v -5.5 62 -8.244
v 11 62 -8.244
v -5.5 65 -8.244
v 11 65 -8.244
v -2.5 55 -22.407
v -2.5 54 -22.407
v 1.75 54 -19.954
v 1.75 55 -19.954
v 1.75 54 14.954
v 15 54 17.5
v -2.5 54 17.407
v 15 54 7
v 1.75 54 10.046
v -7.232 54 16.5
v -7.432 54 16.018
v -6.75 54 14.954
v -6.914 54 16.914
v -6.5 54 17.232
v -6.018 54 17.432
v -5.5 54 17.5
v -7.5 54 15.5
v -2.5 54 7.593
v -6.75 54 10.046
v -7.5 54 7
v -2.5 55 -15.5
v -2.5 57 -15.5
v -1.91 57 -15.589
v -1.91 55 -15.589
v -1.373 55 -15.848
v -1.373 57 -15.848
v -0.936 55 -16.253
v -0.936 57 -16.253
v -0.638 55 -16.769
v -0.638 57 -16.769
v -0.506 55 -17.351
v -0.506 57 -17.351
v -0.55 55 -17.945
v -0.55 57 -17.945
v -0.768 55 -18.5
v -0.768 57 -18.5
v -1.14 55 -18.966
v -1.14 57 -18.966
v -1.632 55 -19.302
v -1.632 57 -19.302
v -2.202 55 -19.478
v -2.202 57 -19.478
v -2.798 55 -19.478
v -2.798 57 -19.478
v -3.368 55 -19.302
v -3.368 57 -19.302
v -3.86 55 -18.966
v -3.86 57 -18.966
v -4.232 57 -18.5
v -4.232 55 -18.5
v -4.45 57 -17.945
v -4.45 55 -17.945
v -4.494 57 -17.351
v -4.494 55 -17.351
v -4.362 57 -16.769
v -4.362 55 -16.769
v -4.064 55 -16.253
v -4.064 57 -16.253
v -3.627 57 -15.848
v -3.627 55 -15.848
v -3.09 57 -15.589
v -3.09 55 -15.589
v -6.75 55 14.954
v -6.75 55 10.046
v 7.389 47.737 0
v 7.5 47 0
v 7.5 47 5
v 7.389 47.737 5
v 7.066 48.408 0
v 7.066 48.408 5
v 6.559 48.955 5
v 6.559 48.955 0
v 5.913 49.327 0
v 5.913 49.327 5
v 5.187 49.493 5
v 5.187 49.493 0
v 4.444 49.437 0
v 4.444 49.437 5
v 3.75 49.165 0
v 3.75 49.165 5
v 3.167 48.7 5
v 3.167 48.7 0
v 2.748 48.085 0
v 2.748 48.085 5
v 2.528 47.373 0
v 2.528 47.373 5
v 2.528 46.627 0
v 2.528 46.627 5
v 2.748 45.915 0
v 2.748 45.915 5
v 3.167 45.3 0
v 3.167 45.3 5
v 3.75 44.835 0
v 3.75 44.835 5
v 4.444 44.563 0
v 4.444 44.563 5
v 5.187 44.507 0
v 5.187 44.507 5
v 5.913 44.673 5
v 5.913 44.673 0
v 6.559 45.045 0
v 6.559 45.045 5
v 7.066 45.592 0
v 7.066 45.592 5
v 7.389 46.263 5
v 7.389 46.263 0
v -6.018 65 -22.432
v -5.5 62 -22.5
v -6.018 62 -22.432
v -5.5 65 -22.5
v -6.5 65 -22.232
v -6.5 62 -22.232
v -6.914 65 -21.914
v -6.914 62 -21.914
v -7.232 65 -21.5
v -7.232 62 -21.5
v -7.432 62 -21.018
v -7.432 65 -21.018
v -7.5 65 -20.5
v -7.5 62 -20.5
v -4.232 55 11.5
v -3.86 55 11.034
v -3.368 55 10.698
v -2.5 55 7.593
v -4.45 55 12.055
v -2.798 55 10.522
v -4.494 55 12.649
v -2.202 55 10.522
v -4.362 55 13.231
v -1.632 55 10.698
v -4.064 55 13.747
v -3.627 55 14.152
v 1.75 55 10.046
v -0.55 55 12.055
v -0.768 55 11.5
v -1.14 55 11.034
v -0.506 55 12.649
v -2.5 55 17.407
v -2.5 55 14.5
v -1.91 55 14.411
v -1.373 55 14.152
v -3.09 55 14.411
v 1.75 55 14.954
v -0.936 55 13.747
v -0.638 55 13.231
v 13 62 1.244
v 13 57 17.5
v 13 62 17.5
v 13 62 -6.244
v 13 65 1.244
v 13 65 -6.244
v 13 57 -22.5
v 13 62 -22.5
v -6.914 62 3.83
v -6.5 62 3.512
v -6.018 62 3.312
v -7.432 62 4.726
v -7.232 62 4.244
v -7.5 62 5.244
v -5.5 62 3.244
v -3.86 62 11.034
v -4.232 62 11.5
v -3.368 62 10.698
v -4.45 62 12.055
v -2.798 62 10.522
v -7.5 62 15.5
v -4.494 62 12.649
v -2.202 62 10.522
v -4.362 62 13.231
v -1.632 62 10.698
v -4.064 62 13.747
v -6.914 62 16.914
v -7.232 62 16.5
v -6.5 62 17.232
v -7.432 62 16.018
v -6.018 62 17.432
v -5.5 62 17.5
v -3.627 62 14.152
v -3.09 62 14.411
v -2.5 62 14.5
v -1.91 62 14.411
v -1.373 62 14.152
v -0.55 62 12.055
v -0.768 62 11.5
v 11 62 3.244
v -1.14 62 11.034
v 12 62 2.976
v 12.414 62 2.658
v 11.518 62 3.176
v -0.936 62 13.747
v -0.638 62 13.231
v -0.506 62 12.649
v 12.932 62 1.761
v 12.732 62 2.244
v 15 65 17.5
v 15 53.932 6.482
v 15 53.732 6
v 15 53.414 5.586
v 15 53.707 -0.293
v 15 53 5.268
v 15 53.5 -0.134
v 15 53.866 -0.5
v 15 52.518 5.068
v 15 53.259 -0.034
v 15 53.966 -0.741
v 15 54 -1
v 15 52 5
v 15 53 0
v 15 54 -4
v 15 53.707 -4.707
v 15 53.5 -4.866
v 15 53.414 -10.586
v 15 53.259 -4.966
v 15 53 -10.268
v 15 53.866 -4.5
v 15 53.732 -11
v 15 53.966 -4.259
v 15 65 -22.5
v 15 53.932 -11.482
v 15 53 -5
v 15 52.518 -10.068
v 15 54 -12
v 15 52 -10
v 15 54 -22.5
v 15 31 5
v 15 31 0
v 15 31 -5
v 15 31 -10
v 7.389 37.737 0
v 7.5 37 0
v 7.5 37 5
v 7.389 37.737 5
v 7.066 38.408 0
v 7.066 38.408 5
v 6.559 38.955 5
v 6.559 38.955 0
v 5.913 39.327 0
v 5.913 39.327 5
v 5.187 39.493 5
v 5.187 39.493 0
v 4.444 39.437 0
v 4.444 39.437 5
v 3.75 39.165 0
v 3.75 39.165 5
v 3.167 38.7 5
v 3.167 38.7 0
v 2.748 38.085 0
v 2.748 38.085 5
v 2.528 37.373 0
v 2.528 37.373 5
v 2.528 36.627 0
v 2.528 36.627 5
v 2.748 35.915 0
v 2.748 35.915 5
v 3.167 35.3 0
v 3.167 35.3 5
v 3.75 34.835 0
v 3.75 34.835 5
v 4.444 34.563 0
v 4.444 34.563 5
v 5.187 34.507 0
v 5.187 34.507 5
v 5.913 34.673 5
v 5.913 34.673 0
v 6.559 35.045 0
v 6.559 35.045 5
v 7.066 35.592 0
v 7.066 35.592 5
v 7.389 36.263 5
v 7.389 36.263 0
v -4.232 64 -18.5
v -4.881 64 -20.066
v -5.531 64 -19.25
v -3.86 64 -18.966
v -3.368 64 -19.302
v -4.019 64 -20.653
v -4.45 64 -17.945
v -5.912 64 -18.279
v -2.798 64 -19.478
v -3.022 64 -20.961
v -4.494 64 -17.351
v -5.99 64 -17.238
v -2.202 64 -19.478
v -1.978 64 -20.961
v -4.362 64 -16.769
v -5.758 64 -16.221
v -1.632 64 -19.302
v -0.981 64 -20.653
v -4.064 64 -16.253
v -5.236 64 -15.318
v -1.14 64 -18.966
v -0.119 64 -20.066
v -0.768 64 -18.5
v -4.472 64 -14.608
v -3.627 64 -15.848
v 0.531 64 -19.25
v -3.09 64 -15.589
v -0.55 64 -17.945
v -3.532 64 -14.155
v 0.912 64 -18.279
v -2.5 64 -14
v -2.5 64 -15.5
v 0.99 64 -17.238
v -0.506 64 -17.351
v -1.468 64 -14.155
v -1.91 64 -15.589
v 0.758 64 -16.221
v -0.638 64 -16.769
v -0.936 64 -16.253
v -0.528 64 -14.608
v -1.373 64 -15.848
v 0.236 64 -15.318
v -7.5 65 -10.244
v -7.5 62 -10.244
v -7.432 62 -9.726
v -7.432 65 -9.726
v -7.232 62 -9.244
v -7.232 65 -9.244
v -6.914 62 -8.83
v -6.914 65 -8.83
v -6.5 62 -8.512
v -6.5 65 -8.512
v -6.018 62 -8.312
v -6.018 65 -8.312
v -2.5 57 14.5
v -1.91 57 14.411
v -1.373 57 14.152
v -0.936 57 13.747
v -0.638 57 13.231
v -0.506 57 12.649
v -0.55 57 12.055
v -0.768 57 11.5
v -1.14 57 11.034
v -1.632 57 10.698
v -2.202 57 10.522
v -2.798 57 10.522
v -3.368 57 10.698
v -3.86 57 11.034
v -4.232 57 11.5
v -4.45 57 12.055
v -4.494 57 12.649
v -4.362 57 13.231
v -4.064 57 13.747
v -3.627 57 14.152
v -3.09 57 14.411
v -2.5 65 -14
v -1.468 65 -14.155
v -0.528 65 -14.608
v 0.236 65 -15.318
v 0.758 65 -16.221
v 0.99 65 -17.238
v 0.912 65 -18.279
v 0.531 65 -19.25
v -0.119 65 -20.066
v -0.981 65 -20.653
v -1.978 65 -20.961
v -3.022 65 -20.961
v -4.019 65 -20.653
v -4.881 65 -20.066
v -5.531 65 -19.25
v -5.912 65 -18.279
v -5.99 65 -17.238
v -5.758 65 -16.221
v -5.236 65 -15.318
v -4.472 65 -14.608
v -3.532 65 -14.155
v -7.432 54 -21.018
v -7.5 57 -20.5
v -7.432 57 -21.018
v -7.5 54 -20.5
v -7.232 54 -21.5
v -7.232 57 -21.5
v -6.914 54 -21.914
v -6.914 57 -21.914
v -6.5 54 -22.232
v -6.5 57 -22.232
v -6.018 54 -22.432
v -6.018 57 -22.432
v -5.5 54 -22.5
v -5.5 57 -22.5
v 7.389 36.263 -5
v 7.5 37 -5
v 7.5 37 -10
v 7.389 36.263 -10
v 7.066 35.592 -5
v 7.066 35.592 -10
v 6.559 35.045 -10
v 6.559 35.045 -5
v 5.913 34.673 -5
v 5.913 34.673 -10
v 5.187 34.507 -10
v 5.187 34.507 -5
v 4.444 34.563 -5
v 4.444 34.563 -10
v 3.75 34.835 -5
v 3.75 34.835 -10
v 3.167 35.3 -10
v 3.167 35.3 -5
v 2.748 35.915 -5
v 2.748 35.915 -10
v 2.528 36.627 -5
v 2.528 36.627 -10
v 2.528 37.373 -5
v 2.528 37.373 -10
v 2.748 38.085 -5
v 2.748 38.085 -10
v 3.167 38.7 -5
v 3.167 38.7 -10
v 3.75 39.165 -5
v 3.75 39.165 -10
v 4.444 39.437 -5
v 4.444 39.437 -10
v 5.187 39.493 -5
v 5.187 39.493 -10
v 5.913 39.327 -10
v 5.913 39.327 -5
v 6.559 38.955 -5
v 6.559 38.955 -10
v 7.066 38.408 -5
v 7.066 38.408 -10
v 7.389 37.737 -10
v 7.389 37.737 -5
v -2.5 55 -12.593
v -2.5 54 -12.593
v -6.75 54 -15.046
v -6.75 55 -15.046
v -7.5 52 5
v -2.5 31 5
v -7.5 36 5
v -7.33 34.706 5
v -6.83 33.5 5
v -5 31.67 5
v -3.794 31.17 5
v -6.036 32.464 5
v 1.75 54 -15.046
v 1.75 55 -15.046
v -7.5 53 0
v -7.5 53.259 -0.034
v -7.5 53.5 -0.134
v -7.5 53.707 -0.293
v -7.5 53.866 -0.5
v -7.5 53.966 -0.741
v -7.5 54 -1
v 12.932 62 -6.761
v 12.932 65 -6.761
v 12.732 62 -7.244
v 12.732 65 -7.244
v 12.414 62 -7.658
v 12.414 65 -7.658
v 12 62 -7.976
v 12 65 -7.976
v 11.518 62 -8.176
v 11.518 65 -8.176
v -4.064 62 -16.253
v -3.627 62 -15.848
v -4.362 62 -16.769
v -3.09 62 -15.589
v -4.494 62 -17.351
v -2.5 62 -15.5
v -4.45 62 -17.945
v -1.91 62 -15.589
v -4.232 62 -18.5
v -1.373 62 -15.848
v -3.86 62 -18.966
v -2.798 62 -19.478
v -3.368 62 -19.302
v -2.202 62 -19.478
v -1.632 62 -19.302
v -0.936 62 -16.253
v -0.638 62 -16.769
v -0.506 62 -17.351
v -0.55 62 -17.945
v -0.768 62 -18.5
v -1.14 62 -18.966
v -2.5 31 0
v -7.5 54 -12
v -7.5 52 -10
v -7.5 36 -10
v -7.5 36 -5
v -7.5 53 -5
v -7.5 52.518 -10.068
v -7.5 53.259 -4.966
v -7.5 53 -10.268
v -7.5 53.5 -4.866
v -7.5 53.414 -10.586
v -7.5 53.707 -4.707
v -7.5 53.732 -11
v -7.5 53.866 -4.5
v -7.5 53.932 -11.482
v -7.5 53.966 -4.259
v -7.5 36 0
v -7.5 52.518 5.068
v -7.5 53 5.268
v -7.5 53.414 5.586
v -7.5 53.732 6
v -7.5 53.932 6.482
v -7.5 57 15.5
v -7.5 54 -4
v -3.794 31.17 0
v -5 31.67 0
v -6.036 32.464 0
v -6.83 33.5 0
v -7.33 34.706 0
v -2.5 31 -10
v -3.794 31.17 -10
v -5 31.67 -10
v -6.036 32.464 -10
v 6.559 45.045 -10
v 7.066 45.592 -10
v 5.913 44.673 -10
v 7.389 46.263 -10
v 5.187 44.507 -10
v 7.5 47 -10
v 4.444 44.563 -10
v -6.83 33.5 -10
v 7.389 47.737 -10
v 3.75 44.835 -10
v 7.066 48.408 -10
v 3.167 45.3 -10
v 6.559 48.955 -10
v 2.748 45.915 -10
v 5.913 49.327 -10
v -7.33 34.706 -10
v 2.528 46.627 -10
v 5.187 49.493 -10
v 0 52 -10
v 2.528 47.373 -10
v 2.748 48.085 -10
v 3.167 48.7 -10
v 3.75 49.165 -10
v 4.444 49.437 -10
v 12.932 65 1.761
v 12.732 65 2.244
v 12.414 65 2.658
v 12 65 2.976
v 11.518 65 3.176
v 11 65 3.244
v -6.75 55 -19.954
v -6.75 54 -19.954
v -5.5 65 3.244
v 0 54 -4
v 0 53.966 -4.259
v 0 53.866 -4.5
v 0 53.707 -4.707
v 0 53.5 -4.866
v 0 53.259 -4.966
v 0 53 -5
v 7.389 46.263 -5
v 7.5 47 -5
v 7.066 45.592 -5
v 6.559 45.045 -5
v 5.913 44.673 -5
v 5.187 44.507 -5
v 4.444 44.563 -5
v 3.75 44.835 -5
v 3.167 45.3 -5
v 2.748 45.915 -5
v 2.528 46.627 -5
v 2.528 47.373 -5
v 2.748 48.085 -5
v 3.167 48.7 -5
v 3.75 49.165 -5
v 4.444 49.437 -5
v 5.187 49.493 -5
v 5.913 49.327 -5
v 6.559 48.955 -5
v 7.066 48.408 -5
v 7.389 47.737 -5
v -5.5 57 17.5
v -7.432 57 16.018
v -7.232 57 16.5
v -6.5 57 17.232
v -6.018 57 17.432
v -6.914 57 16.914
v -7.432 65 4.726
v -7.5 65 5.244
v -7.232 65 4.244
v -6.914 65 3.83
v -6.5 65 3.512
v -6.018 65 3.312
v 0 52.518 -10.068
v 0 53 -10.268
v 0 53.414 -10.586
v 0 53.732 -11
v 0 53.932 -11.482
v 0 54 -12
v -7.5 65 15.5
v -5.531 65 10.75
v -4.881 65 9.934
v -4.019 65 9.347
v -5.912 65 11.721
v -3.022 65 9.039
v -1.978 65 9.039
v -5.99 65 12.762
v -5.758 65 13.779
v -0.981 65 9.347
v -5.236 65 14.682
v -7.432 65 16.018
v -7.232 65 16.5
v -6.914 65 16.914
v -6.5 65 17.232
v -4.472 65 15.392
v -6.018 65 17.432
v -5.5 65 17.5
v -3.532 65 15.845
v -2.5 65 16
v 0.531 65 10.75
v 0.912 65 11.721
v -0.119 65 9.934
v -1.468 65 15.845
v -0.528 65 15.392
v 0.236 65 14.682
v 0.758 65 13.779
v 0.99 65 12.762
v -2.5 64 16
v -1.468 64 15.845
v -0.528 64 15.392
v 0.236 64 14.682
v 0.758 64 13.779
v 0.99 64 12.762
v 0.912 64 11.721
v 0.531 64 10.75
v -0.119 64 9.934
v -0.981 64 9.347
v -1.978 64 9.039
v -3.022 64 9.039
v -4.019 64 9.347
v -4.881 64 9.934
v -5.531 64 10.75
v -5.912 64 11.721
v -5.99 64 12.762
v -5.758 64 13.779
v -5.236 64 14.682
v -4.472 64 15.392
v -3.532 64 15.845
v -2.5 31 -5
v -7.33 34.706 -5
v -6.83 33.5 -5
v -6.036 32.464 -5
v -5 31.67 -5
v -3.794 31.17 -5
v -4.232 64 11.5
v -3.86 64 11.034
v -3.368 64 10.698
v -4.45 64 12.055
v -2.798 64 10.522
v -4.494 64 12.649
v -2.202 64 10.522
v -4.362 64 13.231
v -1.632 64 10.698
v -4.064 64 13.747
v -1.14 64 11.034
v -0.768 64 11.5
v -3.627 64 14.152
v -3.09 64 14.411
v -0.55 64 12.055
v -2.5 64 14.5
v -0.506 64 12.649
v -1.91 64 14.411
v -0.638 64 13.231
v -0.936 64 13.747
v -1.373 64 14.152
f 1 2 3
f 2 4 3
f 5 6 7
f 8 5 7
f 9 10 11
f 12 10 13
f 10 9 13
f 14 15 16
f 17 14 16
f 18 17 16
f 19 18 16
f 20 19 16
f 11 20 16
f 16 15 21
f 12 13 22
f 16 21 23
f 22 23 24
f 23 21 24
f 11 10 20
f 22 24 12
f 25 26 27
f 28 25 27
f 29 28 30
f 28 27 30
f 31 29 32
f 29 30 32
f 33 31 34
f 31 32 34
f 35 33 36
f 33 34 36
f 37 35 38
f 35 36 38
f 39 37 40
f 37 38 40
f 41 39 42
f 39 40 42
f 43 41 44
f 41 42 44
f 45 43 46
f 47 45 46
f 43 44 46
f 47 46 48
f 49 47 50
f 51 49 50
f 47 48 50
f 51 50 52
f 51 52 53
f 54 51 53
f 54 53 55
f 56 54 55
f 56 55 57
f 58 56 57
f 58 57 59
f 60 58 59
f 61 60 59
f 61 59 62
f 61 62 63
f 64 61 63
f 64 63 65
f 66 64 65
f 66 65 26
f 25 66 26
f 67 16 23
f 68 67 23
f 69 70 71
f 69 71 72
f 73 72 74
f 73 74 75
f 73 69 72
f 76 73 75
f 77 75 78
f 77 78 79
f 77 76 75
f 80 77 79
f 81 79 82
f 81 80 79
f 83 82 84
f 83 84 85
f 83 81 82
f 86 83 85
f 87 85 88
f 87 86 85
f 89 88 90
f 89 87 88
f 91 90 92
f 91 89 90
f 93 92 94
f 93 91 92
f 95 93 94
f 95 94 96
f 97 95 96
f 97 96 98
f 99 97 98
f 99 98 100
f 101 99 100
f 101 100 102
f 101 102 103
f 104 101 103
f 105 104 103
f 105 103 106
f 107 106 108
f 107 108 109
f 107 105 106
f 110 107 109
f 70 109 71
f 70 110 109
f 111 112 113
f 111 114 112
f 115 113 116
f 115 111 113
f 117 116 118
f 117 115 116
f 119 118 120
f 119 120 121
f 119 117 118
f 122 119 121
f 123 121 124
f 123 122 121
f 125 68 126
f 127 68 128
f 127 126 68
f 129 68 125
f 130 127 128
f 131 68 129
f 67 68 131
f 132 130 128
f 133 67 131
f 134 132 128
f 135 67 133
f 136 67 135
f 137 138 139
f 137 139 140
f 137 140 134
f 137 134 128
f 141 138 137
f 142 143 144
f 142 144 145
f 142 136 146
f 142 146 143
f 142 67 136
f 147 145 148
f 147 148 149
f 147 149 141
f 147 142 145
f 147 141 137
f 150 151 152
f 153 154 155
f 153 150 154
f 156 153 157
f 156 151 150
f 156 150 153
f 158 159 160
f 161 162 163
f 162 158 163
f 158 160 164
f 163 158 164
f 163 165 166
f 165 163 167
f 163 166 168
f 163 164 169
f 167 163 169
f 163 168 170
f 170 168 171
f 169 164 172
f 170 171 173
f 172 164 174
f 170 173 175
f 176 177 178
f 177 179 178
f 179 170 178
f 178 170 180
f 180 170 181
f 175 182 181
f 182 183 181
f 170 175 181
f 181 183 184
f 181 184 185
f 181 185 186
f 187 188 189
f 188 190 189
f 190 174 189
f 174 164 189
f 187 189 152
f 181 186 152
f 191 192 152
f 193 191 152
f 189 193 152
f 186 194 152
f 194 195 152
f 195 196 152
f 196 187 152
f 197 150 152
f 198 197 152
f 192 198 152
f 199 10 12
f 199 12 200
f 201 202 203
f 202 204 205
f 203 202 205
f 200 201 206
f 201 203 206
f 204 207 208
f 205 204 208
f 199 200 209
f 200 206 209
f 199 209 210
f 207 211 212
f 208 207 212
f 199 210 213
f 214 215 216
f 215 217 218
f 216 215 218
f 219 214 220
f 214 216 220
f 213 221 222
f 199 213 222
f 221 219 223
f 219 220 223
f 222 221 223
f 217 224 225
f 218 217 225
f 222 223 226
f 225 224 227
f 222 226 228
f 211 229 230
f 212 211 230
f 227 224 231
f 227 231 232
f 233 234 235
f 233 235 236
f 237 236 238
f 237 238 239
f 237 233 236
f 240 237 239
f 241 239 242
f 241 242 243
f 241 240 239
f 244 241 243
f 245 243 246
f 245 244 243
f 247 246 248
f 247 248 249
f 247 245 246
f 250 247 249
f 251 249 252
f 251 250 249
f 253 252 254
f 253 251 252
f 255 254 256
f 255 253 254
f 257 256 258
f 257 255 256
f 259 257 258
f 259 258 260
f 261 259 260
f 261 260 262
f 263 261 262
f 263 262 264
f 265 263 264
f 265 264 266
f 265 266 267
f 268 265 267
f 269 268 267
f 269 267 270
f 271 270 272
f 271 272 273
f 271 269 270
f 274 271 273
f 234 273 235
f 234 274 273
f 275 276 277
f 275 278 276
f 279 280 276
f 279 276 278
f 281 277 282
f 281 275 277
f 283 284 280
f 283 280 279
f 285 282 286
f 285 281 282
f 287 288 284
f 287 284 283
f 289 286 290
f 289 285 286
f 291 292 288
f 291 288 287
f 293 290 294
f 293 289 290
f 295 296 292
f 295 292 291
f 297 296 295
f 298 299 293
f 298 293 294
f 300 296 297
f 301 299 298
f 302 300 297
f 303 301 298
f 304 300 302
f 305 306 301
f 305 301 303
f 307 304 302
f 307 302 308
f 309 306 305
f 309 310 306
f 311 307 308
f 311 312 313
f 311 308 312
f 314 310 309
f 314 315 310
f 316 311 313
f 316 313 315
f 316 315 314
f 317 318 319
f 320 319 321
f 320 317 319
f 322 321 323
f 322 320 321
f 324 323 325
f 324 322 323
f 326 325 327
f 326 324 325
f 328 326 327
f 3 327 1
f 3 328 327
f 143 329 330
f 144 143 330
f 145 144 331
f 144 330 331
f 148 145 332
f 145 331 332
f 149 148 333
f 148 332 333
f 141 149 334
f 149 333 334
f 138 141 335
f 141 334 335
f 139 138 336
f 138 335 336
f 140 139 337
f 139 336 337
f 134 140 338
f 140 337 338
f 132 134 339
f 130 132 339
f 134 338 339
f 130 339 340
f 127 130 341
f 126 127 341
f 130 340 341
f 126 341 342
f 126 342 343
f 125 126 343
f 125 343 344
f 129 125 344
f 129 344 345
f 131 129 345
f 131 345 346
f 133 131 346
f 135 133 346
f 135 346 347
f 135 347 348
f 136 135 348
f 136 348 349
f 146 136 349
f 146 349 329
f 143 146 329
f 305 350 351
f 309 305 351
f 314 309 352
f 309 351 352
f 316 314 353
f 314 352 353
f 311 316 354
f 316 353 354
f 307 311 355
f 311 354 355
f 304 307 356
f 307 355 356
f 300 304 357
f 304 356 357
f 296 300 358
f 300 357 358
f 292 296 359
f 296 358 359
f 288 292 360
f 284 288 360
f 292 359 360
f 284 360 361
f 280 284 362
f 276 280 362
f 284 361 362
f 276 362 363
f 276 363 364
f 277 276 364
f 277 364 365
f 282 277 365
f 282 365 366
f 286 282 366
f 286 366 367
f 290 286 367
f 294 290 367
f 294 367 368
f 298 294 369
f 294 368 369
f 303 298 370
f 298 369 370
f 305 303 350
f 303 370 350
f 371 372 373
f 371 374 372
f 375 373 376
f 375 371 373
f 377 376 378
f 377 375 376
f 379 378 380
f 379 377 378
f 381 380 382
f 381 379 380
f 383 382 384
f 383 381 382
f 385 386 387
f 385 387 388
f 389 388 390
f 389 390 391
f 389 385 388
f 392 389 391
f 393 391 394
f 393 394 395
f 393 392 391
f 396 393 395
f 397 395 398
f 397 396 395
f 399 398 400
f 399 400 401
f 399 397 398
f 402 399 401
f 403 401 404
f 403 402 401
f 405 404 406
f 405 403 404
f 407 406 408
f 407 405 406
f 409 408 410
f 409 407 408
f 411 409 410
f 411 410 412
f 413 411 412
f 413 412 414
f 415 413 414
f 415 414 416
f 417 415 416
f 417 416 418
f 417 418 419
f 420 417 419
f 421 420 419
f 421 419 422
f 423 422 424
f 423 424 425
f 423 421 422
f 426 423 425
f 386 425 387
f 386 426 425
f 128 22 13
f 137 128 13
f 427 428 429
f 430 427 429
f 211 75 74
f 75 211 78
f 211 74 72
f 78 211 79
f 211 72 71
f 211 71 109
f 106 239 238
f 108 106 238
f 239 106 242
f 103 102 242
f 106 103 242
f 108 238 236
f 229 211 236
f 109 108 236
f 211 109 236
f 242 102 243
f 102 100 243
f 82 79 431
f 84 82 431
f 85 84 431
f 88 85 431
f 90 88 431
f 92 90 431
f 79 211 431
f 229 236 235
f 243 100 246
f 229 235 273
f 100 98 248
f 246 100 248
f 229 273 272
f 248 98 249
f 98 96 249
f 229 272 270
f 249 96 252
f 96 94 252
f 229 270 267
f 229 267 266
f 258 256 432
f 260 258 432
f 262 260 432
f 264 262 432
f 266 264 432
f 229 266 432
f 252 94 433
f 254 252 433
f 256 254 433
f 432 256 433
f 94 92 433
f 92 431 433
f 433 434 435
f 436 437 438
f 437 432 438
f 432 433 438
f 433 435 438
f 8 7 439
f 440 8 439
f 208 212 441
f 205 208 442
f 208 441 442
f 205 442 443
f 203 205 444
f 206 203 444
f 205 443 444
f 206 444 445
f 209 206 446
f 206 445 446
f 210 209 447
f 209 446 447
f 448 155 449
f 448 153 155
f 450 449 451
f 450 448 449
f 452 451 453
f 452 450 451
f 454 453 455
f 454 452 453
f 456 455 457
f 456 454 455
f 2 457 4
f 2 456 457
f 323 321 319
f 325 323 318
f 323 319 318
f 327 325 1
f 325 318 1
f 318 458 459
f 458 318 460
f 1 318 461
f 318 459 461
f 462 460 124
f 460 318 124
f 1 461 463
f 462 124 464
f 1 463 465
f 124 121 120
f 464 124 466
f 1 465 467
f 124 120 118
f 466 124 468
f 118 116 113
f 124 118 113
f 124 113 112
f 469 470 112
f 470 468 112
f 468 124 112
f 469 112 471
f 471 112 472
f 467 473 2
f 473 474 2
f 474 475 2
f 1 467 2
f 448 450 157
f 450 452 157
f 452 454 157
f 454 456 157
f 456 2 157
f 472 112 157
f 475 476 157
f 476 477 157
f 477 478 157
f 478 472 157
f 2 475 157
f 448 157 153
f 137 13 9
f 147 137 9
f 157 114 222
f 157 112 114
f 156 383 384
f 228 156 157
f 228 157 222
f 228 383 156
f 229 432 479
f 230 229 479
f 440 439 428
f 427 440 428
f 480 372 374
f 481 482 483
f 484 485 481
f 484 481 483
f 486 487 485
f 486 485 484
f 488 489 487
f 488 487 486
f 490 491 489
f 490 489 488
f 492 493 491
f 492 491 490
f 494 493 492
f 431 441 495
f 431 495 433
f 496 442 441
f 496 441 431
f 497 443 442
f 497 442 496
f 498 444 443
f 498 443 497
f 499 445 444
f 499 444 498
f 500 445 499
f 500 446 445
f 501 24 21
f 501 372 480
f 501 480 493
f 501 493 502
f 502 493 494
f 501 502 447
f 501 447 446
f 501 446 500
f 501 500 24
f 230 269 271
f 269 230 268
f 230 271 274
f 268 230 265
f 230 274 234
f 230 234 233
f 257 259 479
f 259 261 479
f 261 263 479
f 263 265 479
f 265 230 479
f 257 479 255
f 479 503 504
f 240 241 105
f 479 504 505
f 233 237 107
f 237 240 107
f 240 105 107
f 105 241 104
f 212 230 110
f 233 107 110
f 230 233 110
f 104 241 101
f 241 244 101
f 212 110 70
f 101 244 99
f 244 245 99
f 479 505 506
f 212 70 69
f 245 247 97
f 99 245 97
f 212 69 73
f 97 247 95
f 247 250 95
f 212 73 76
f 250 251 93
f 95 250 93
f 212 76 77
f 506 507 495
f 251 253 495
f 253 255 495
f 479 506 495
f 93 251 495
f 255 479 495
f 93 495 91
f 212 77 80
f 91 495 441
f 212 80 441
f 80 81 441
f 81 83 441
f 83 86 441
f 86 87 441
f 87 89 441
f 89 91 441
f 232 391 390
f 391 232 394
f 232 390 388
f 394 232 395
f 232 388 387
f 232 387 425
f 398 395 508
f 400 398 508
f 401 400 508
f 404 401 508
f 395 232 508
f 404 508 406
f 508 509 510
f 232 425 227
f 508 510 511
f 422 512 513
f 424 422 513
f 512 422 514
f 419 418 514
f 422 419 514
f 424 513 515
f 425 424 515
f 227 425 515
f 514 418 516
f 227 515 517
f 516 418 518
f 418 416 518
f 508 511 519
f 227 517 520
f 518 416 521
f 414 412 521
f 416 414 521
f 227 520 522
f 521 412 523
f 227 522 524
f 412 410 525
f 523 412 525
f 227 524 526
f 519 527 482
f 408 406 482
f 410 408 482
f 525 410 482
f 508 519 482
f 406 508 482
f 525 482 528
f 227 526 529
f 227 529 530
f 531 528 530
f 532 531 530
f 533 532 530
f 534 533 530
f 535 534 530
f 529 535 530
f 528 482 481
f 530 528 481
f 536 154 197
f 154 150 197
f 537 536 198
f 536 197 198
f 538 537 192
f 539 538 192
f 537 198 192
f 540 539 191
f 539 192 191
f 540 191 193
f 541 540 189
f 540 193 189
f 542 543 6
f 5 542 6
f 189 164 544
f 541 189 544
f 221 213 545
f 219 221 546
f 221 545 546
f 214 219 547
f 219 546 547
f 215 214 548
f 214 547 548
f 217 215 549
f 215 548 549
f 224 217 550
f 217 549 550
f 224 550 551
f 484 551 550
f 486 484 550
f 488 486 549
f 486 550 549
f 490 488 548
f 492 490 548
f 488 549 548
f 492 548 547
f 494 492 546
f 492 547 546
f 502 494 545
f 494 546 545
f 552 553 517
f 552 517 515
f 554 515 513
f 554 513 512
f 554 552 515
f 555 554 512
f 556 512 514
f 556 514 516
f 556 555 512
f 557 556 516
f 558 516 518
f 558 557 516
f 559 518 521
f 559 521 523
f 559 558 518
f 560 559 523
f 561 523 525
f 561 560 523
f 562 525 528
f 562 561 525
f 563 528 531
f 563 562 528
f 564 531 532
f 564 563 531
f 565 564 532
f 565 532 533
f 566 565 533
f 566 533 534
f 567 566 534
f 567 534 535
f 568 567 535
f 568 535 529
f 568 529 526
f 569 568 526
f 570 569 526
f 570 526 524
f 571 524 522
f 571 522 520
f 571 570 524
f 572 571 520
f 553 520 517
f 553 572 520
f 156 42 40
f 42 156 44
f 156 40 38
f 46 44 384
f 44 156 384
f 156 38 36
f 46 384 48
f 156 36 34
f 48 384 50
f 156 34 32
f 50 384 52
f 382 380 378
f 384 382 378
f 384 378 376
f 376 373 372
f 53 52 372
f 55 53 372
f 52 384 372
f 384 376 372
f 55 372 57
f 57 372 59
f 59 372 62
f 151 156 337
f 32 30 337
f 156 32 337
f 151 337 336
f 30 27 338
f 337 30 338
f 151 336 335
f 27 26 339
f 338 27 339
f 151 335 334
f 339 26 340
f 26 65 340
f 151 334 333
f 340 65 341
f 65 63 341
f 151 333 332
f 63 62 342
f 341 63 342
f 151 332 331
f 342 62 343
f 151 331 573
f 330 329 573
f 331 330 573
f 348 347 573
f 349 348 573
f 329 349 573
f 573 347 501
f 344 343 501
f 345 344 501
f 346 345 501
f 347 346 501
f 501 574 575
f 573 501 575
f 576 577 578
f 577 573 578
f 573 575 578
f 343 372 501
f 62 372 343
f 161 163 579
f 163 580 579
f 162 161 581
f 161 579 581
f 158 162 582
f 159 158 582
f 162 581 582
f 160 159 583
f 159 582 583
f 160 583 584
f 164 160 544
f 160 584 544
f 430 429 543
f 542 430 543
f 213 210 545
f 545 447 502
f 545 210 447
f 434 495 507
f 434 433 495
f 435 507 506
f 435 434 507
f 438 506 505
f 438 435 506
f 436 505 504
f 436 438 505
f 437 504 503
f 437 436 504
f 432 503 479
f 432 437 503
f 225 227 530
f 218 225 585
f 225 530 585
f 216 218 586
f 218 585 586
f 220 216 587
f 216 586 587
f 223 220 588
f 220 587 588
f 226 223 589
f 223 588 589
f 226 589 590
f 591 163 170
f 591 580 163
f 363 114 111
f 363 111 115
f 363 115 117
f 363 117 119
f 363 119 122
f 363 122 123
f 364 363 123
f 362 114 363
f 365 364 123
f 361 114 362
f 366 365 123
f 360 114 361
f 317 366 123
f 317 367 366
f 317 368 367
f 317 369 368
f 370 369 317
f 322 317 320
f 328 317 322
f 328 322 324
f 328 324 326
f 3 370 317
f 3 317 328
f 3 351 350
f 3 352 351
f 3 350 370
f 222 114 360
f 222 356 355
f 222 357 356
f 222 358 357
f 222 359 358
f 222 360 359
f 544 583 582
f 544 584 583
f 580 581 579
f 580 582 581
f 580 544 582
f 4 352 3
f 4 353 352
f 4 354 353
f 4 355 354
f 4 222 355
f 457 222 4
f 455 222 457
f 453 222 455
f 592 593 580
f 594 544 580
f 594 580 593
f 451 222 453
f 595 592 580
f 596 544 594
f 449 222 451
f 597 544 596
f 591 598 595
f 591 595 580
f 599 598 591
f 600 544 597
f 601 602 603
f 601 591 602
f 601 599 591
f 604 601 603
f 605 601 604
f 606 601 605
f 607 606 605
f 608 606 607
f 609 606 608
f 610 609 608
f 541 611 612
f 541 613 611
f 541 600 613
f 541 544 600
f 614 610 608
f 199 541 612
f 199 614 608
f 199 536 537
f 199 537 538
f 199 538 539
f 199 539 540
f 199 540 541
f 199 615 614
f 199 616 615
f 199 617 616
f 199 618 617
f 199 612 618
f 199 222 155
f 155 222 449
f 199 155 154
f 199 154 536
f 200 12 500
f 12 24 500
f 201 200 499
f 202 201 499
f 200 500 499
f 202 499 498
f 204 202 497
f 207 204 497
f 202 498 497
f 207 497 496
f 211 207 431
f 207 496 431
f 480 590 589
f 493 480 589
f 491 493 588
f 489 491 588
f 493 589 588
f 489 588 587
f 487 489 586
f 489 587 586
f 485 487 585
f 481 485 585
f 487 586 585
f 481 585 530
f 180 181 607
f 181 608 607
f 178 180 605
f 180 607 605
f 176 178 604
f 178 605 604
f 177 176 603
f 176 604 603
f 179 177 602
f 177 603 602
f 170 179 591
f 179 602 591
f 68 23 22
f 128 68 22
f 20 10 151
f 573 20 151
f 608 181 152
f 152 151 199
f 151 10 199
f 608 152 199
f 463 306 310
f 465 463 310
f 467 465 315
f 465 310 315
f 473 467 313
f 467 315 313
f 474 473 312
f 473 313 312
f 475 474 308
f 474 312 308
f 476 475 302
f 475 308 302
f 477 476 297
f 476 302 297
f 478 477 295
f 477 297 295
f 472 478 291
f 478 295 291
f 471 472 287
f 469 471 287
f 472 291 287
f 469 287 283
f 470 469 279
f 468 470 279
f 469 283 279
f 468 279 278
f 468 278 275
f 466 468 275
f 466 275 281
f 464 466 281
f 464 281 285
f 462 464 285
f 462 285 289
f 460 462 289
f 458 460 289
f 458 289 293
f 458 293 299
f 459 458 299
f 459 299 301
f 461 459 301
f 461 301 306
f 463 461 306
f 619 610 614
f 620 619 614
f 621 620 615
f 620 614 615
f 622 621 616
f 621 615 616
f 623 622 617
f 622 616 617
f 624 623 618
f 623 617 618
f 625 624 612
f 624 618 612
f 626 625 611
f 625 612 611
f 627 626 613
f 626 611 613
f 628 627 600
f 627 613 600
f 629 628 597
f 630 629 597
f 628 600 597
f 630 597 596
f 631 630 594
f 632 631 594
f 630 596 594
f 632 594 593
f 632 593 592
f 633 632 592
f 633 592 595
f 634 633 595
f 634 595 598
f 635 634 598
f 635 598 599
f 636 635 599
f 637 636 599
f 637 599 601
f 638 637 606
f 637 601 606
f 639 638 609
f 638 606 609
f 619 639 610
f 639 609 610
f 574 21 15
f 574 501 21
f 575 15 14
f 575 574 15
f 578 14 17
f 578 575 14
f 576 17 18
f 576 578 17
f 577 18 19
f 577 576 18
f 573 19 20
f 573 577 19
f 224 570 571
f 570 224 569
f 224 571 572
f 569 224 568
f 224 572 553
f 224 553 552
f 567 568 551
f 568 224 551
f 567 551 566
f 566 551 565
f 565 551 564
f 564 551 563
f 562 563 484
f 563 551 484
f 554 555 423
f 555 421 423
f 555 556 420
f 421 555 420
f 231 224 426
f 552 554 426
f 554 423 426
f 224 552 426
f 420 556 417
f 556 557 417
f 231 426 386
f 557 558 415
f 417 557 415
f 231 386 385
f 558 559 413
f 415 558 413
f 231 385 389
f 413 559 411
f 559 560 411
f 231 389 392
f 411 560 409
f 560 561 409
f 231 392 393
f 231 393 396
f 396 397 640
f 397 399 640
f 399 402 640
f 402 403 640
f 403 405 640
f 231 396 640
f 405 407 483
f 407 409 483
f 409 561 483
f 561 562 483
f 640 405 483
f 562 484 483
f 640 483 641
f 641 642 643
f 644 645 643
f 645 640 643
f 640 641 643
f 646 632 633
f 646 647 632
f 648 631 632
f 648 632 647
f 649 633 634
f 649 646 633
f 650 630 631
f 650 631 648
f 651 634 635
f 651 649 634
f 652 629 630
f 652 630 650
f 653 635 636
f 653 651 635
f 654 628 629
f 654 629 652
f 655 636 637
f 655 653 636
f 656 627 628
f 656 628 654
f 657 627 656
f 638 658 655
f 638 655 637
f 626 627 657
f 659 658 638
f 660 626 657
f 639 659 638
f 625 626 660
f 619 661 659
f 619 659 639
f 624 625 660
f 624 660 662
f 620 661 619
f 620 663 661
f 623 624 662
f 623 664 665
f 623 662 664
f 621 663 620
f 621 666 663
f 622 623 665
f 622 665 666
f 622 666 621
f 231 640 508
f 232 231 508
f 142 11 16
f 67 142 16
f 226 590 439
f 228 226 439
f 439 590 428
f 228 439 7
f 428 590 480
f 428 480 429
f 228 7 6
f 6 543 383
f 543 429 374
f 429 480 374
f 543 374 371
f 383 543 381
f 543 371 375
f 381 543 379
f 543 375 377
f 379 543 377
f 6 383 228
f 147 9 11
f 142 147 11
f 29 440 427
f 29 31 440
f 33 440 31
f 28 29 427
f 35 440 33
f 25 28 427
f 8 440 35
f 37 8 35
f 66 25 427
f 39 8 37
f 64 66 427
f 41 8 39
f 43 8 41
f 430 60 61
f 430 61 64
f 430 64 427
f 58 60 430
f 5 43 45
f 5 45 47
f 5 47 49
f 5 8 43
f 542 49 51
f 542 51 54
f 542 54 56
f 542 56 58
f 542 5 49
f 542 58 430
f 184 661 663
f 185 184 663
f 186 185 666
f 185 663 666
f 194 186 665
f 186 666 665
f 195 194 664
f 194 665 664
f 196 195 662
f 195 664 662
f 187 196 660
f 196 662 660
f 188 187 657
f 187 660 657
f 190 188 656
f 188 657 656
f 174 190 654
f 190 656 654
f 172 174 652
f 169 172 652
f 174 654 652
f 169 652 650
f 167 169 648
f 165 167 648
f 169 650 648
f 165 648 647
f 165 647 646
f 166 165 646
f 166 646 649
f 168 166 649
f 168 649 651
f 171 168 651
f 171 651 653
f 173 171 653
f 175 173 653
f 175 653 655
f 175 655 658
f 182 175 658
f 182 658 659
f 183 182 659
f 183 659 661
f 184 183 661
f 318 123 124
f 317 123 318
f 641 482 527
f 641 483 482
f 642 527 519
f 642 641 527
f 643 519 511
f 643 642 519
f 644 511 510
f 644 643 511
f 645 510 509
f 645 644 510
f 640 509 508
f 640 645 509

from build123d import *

# Parameters (mm, degrees)
SKETCH2_W            = 10
SKETCH2_H            = 21
SKETCH2_R            = 2.5
BOSS_EXTRUDE1_DEPTH  = 5
BOSS_EXTRUDE3_START  = 5
SKETCH3_W            = 10
SKETCH3_H            = 21
SKETCH3_R            = 2.5
BOSS_EXTRUDE3_DEPTH  = 5
SKETCH4_W            = 10
SKETCH4_H            = 5
BOSS_EXTRUDE4_DEPTH  = 2
SKETCH5_W            = 10
SKETCH5_H            = 5
BOSS_EXTRUDE5_DEPTH  = 2
BOSS_EXTRUDE6_DEPTH  = 3
FILLET1_R            = 1
FILLET2_R            = 2
BOSS_EXTRUDE7_DEPTH  = 5
SKETCH9_W            = 2
SKETCH9_H            = 40
BOSS_EXTRUDE8_DEPTH  = 5
SKETCH10_W           = 15
SKETCH10_H           = 40
BOSS_EXTRUDE9_DEPTH  = 3
CUT_EXTRUDE1_DEPTH   = 3
SKETCH13_W           = 14.256248666
SKETCH13_H           = 3
BOSS_EXTRUDE10_DEPTH = 7.5
SKETCH14_R           = 2
CUT_EXTRUDE2_DEPTH   = 44.44249072
SKETCH15_R           = 3.5
CUT_EXTRUDE3_DEPTH   = 1
CUT_EXTRUDE4_DEPTH   = 1
CUT_EXTRUDE5_DEPTH   = 1
FILLET3_R            = 5
FILLET4_R            = 2
FILLET5_R            = 2


with BuildPart() as part:
    # Sketch2 → Boss-Extrude1 (new body)
    with BuildSketch(Plane.XY):
        with Locations((5, 41.5)):
            Rectangle(SKETCH2_W, SKETCH2_H)
        with Locations((5, 47)):
            Circle(SKETCH2_R, mode=Mode.SUBTRACT)
        with Locations((5, 37)):
            Circle(SKETCH2_R, mode=Mode.SUBTRACT)
    extrude(amount=BOSS_EXTRUDE1_DEPTH)

    # Sketch4 → Boss-Extrude4 (add)
    with BuildSketch(Plane(origin=(0, 52, 0), x_dir=(1, 0, 0), z_dir=(0, 1, 0))):
        with Locations((5, -2.5)):
            Rectangle(SKETCH4_W, SKETCH4_H)
    extrude(amount=BOSS_EXTRUDE4_DEPTH)



with BuildPart() as body_2:
    # Sketch3 → Boss-Extrude3 (new body)
    with BuildSketch(Plane(origin=(0, 0, 0), x_dir=(-1, 0, 0), z_dir=(0, 0, -1)).offset(BOSS_EXTRUDE3_START)):
        with Locations((-5, 41.5)):
            Rectangle(SKETCH3_W, SKETCH3_H)
        with Locations(Location((-5, 37, 0), (0, 0, 180))):
            Circle(SKETCH3_R, mode=Mode.SUBTRACT)
        with Locations(Location((-5, 47, 0), (0, 0, 180))):
            Circle(SKETCH3_R, mode=Mode.SUBTRACT)
    extrude(amount=BOSS_EXTRUDE3_DEPTH)

    # Sketch5 → Boss-Extrude5 (add)
    with BuildSketch(Plane(origin=(0, 52, 0), x_dir=(1, 0, 0), z_dir=(0, 1, 0))):
        with Locations((5, 7.5)):
            Rectangle(SKETCH5_W, SKETCH5_H)
    extrude(amount=BOSS_EXTRUDE5_DEPTH)


with BuildPart() as part_1:
    add(part.part)

    add(body_2.part)  # Boss-Extrude6 merges body 2
    # Sketch6 → Boss-Extrude6 (add)
    with BuildSketch(Plane(origin=(0, 54, 0), x_dir=(1, 0, 0), z_dir=(0, 1, 0))):
        Polygon((10, -5), (10, -17.5), (0, -17.5), (0, -5), (0, 10), (0, 22.5), (10, 22.5), (10, 10), align=None)
    extrude(amount=BOSS_EXTRUDE6_DEPTH)

    # Fillet1
    fillet1_edges = [part_1.edges().sort_by_distance(p)[0] for p in [
        (5, 54, 0),
        (5, 54, -5),
    ]]
    fillet(fillet1_edges, radius=FILLET1_R)

    # Fillet2
    fillet2_edges = [part_1.edges().sort_by_distance(p)[0] for p in [
        (5, 54, 5),
        (5, 54, -10),
    ]]
    fillet(fillet2_edges, radius=FILLET2_R)

    # Sketch8 → Boss-Extrude7 (add)
    with BuildSketch(Plane(origin=(10, 0, 0), x_dir=(0, 0, -1), z_dir=(1, 0, 0))):
        with BuildLine():
            Line((0, 31), (0, 53))
            ThreePointArc((0, 53), (0.292893219, 53.707106781), (1, 54))
            Line((1, 54), (4, 54))
            ThreePointArc((4, 54), (4.707106781, 53.707106781), (5, 53))
            Line((5, 53), (5, 31))
            Line((5, 31), (10, 31))
            Line((10, 31), (10, 52))
            ThreePointArc((10, 52), (10.585786438, 53.414213562), (12, 54))
            Line((12, 54), (22.5, 54))
            Line((22.5, 54), (22.5, 57))
            Line((22.5, 57), (-17.5, 57))
            Line((-17.5, 57), (-17.5, 54))
            Line((-17.5, 54), (-7, 54))
            ThreePointArc((-7, 54), (-5.585786438, 53.414213562), (-5, 52))
            Line((-5, 52), (-5, 31))
            Line((-5, 31), (0, 31))
        make_face()
    extrude(amount=BOSS_EXTRUDE7_DEPTH)

    # Sketch9 → Boss-Extrude8 (add)
    with BuildSketch(Plane(origin=(0, 57, 0), x_dir=(1, 0, 0), z_dir=(0, 1, 0))):
        with Locations((14, 2.5)):
            Rectangle(SKETCH9_W, SKETCH9_H)
    extrude(amount=BOSS_EXTRUDE8_DEPTH)

    # Sketch10 → Boss-Extrude9 (add)
    with BuildSketch(Plane(origin=(0, 62, 0), x_dir=(1, 0, 0), z_dir=(0, 1, 0))):
        with Locations((7.5, 2.5)):
            Rectangle(SKETCH10_W, SKETCH10_H)
    extrude(amount=BOSS_EXTRUDE9_DEPTH)

    # Sketch12 → Cut-Extrude1 (cut)
    with BuildSketch(Plane(origin=(0, 65, 0), x_dir=(1, 0, 0), z_dir=(0, 1, 0))):
        Polygon((13, 8.243751334), (2, 8.243751334), (0, 8.243751334), (0, -3.243751334), (2, -3.243751334), (13, -3.243751334), align=None)
    extrude(amount=-CUT_EXTRUDE1_DEPTH, mode=Mode.SUBTRACT)

    # Sketch13 → Boss-Extrude10 (add)
    with BuildSketch(Plane.ZY):
        with Locations((10.371875667, 63.5)):
            Rectangle(SKETCH13_W, SKETCH13_H)
        with BuildLine():
            Line((-4, 54), (-1, 54))
            ThreePointArc((-1, 54), (-0.292893219, 53.707106781), (0, 53))
            Line((0, 53), (0, 31))
            Line((0, 31), (5, 31))
            Line((5, 31), (5, 52))
            ThreePointArc((5, 52), (5.585786438, 53.414213562), (7, 54))
            Line((7, 54), (17.5, 54))
            Line((17.5, 54), (17.5, 57))
            Line((17.5, 57), (-22.5, 57))
            Line((-22.5, 57), (-22.5, 54))
            Line((-22.5, 54), (-12, 54))
            ThreePointArc((-12, 54), (-10.585786438, 53.414213562), (-10, 52))
            Line((-10, 52), (-10, 31))
            Line((-10, 31), (-5, 31))
            Line((-5, 31), (-5, 53))
            ThreePointArc((-5, 53), (-4.707106781, 53.707106781), (-4, 54))
        make_face()
        with Locations((-15.371875667, 63.5)):
            Rectangle(SKETCH13_W, SKETCH13_H)
    extrude(amount=BOSS_EXTRUDE10_DEPTH)

    # Sketch14 → Cut-Extrude2 (cut, through all)
    with BuildSketch(Plane(origin=(0, 65, 0), x_dir=(1, 0, 0), z_dir=(0, 1, 0))):
        with Locations(Location((-2.5, -12.5, 0), (0, 0, 270))):
            Circle(SKETCH14_R)
        with Locations(Location((-2.5, 17.5, 0), (0, 0, 270))):
            Circle(SKETCH14_R)
    extrude(amount=-CUT_EXTRUDE2_DEPTH, mode=Mode.SUBTRACT)

    # Sketch15 → Cut-Extrude3 (cut)
    with BuildSketch(Plane(origin=(0, 65, 0), x_dir=(1, 0, 0), z_dir=(0, 1, 0))):
        with Locations(Location((-2.5, 17.5, 0), (0, 0, 270))):
            Circle(SKETCH15_R)
        with Locations(Location((-2.5, -12.5, 0), (0, 0, 270))):
            Circle(SKETCH15_R)
    extrude(amount=-CUT_EXTRUDE3_DEPTH, mode=Mode.SUBTRACT)

    # Sketch16 → Cut-Extrude4 (cut)
    with BuildSketch(Plane.XZ.offset(-54)):
        Polygon((-6.75, 14.953738644), (-6.75, 10.046261356), (-2.5, 7.592522712), (1.75, 10.046261356), (1.75, 14.953738644), (-2.5, 17.407477288), align=None)
    extrude(amount=-CUT_EXTRUDE4_DEPTH, mode=Mode.SUBTRACT)

    # Sketch17 → Cut-Extrude5 (cut)
    with BuildSketch(Plane(origin=(0, 54, 0), x_dir=(-1, 0, 0), z_dir=(0, -1, 0))):
        Polygon((6.75, 15.046261356), (6.75, 19.953738644), (2.5, 22.407477288), (-1.75, 19.953738644), (-1.75, 15.046261356), (2.5, 12.592522712), align=None)
    extrude(amount=-CUT_EXTRUDE5_DEPTH, mode=Mode.SUBTRACT)

    # Fillet3
    fillet3_edges = [part_1.edges().sort_by_distance(p)[0] for p in [
        (-7.5, 31, 2.5),
        (-7.5, 31, -7.5),
    ]]
    fillet(fillet3_edges, radius=FILLET3_R)

    # Fillet4
    fillet4_edges = [part_1.edges().sort_by_distance(p)[0] for p in [
        (-7.5, 55.5, 17.5),
        (-7.5, 55.5, -22.5),
        (-7.5, 63.5, 17.5),
        (-7.5, 63.5, 3.243751334),
        (-7.5, 63.5, -22.5),
        (-7.5, 63.5, -8.243751334),
    ]]
    fillet(fillet4_edges, radius=FILLET4_R)

    # Fillet5
    fillet5_edges = [part_1.edges().sort_by_distance(p)[0] for p in [
        (13, 63.5, -8.243751334),
        (13, 63.5, 3.243751334),
    ]]
    fillet(fillet5_edges, radius=FILLET5_R)


solid = part_1.part
